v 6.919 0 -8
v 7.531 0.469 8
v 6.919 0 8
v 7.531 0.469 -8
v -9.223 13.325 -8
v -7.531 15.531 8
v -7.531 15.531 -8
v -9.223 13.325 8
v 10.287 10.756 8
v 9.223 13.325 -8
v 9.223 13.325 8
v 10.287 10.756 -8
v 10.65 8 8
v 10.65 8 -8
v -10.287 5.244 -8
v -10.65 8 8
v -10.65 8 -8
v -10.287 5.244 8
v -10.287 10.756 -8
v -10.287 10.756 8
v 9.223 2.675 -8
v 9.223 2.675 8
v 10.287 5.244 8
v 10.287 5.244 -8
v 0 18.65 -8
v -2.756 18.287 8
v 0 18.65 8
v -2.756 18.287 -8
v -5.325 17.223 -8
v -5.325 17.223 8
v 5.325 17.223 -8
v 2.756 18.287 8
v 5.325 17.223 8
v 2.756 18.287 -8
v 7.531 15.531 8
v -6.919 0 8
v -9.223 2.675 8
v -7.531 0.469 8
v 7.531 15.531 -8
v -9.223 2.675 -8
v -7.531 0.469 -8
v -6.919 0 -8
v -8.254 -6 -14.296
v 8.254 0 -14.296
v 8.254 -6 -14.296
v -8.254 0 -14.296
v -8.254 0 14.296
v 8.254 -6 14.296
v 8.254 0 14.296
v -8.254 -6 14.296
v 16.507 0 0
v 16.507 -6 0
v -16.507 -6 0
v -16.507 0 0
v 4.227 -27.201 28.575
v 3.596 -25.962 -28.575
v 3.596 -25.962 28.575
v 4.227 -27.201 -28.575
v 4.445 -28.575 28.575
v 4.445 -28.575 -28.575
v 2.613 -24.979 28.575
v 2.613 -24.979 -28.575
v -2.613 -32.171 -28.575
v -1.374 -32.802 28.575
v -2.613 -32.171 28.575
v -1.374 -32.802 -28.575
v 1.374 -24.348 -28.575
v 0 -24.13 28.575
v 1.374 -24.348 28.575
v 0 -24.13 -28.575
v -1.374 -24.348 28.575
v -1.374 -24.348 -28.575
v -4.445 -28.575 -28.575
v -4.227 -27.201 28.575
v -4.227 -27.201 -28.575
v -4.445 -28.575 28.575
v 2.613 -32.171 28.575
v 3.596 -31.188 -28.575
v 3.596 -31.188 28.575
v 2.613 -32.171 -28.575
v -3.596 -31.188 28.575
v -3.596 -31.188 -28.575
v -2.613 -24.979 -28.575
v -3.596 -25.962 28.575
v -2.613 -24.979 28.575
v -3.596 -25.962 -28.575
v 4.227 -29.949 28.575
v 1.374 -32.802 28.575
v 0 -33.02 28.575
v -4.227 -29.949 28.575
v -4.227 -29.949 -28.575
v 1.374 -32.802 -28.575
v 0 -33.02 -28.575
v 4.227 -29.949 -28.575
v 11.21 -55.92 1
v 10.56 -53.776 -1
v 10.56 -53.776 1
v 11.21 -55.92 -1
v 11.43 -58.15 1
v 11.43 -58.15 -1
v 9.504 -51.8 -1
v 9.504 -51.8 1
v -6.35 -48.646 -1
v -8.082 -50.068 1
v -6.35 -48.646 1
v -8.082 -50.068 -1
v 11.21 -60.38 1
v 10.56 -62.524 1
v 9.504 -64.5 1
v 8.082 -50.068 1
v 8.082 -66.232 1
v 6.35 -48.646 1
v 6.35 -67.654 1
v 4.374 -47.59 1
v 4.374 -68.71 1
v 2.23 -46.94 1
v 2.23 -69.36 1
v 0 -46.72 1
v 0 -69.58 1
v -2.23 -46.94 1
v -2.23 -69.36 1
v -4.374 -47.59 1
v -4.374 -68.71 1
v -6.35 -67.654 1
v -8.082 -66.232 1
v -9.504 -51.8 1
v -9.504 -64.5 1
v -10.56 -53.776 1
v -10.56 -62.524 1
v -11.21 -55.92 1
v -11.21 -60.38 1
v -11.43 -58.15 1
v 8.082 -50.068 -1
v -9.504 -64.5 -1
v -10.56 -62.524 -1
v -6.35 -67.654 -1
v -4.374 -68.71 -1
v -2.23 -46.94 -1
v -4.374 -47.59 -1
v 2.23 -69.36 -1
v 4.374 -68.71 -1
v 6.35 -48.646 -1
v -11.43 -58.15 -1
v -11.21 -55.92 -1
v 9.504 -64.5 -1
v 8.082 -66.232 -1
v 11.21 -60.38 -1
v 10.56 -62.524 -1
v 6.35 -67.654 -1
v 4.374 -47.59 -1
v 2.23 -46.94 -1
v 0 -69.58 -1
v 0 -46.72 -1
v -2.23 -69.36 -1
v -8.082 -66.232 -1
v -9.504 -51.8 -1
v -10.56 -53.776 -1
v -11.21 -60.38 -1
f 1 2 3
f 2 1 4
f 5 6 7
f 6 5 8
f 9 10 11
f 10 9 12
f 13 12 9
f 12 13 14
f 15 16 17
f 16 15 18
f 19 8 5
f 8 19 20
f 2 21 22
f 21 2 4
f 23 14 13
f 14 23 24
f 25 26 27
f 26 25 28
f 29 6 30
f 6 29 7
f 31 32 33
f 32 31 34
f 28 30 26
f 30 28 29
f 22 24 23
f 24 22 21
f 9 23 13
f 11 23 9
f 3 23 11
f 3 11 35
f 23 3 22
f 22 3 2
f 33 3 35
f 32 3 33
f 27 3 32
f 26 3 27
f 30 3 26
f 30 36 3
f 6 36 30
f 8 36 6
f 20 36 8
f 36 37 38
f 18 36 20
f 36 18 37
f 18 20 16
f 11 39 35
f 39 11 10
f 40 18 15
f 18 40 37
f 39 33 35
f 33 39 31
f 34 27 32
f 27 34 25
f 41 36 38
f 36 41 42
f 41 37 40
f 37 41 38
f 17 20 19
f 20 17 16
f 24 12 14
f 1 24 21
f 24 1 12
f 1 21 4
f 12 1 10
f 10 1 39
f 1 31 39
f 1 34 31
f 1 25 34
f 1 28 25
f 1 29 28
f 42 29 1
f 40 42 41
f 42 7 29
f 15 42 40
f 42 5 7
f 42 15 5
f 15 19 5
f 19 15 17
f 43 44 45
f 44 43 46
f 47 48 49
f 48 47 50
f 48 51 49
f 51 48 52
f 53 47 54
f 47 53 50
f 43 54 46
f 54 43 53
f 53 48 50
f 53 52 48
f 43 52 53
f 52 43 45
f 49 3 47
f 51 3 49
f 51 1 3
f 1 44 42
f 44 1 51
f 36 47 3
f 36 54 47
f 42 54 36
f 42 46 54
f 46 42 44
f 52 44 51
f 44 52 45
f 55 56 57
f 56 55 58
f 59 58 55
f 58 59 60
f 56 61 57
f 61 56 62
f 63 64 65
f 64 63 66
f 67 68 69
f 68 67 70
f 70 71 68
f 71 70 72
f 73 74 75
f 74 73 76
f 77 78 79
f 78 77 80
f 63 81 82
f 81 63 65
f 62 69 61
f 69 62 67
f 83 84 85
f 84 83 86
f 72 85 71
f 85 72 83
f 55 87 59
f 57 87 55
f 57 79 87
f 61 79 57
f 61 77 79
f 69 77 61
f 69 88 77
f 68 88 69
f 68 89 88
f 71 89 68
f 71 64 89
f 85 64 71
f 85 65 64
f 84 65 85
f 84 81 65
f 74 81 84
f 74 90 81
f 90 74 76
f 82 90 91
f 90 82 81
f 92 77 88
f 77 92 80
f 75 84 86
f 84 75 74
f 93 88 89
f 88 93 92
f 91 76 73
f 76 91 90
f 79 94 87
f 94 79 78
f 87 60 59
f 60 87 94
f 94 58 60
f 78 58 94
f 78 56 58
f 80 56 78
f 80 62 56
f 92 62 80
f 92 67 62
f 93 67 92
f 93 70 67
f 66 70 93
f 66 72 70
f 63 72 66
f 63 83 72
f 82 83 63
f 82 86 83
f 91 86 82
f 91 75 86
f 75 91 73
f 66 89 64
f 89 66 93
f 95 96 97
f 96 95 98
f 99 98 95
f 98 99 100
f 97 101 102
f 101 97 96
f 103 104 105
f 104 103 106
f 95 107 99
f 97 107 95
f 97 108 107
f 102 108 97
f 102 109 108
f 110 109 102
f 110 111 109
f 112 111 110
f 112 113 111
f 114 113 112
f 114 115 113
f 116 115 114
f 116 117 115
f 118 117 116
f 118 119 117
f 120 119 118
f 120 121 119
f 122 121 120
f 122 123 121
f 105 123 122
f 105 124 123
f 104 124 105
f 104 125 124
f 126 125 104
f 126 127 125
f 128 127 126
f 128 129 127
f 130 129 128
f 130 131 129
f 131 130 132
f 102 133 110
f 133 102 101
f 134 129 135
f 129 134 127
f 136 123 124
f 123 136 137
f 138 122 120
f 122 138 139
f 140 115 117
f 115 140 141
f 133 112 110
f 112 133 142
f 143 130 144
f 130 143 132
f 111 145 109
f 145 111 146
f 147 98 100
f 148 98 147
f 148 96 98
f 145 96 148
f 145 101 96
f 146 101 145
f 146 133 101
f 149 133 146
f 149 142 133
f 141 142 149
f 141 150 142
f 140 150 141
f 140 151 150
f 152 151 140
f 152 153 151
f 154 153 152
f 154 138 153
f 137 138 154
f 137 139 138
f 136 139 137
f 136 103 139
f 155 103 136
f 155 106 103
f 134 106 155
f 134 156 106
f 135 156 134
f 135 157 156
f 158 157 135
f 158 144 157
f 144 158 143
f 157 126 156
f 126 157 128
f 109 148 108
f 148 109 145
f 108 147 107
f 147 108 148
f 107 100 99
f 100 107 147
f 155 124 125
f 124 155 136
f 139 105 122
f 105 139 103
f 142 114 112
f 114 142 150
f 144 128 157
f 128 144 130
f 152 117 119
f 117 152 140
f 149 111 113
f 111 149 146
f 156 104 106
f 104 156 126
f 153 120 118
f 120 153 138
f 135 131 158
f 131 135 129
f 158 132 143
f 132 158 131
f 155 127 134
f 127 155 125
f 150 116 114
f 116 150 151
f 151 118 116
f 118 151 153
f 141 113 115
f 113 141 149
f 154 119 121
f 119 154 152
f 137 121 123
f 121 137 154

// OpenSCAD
// Auto-generated by scripts/author_from_manifest.py (Phase D.3).
// Source: data/phase_d_manifest.json (sku_intent='reliable-g6-concealed-155f').
// Do not hand-edit — regenerate from the manifest.
//
// @part reliable_g6_concealed_155f
// @kind sprinkler_head
// @category head.pendant.k56
// @display-name "Reliable G6 Concealed Pendent K5.6 155°F"
// @mfg reliable_automatic_sprinkler
// @mfg-pn G6
// @listing UL FM
// @hazard-classes LH OH1
// @price-usd 26.50
// @install-minutes 10
// @crew journeyman
// @k-factor 5.6
// @orientation pendant
// @response quick
// @temperature 155F
// @param size_in number default=0.5 label="Size" unit="in"
// @port inlet position=[0,0.014,0] direction=[0,1,0] style=NPT_threaded size_in=0.5 role=drop

size_in = 0.5;
k_factor = 5.6;

length_mm   = 57.15;
body_dia_mm = 25.40;
thread_od   = 21.3;
thread_len  = 16;
deflector_d = body_dia_mm * 0.9;

 union() {
    translate([0, thread_len/2, 0])
        cylinder(h = thread_len, d = thread_od, center = true, $fn = 24);
    translate([0, -3, 0])
        rotate([90, 0, 0])
        cylinder(h = 6, d = thread_od * 1.55, $fn = 6, center = true);
    translate([0, -length_mm/2, 0])
        cylinder(h = length_mm, d = body_dia_mm * 0.35, center = true, $fn = 20);
    translate([0, -length_mm - 1, 0])
        cylinder(h = 2, d = deflector_d, center = true, $fn = 32);
}
